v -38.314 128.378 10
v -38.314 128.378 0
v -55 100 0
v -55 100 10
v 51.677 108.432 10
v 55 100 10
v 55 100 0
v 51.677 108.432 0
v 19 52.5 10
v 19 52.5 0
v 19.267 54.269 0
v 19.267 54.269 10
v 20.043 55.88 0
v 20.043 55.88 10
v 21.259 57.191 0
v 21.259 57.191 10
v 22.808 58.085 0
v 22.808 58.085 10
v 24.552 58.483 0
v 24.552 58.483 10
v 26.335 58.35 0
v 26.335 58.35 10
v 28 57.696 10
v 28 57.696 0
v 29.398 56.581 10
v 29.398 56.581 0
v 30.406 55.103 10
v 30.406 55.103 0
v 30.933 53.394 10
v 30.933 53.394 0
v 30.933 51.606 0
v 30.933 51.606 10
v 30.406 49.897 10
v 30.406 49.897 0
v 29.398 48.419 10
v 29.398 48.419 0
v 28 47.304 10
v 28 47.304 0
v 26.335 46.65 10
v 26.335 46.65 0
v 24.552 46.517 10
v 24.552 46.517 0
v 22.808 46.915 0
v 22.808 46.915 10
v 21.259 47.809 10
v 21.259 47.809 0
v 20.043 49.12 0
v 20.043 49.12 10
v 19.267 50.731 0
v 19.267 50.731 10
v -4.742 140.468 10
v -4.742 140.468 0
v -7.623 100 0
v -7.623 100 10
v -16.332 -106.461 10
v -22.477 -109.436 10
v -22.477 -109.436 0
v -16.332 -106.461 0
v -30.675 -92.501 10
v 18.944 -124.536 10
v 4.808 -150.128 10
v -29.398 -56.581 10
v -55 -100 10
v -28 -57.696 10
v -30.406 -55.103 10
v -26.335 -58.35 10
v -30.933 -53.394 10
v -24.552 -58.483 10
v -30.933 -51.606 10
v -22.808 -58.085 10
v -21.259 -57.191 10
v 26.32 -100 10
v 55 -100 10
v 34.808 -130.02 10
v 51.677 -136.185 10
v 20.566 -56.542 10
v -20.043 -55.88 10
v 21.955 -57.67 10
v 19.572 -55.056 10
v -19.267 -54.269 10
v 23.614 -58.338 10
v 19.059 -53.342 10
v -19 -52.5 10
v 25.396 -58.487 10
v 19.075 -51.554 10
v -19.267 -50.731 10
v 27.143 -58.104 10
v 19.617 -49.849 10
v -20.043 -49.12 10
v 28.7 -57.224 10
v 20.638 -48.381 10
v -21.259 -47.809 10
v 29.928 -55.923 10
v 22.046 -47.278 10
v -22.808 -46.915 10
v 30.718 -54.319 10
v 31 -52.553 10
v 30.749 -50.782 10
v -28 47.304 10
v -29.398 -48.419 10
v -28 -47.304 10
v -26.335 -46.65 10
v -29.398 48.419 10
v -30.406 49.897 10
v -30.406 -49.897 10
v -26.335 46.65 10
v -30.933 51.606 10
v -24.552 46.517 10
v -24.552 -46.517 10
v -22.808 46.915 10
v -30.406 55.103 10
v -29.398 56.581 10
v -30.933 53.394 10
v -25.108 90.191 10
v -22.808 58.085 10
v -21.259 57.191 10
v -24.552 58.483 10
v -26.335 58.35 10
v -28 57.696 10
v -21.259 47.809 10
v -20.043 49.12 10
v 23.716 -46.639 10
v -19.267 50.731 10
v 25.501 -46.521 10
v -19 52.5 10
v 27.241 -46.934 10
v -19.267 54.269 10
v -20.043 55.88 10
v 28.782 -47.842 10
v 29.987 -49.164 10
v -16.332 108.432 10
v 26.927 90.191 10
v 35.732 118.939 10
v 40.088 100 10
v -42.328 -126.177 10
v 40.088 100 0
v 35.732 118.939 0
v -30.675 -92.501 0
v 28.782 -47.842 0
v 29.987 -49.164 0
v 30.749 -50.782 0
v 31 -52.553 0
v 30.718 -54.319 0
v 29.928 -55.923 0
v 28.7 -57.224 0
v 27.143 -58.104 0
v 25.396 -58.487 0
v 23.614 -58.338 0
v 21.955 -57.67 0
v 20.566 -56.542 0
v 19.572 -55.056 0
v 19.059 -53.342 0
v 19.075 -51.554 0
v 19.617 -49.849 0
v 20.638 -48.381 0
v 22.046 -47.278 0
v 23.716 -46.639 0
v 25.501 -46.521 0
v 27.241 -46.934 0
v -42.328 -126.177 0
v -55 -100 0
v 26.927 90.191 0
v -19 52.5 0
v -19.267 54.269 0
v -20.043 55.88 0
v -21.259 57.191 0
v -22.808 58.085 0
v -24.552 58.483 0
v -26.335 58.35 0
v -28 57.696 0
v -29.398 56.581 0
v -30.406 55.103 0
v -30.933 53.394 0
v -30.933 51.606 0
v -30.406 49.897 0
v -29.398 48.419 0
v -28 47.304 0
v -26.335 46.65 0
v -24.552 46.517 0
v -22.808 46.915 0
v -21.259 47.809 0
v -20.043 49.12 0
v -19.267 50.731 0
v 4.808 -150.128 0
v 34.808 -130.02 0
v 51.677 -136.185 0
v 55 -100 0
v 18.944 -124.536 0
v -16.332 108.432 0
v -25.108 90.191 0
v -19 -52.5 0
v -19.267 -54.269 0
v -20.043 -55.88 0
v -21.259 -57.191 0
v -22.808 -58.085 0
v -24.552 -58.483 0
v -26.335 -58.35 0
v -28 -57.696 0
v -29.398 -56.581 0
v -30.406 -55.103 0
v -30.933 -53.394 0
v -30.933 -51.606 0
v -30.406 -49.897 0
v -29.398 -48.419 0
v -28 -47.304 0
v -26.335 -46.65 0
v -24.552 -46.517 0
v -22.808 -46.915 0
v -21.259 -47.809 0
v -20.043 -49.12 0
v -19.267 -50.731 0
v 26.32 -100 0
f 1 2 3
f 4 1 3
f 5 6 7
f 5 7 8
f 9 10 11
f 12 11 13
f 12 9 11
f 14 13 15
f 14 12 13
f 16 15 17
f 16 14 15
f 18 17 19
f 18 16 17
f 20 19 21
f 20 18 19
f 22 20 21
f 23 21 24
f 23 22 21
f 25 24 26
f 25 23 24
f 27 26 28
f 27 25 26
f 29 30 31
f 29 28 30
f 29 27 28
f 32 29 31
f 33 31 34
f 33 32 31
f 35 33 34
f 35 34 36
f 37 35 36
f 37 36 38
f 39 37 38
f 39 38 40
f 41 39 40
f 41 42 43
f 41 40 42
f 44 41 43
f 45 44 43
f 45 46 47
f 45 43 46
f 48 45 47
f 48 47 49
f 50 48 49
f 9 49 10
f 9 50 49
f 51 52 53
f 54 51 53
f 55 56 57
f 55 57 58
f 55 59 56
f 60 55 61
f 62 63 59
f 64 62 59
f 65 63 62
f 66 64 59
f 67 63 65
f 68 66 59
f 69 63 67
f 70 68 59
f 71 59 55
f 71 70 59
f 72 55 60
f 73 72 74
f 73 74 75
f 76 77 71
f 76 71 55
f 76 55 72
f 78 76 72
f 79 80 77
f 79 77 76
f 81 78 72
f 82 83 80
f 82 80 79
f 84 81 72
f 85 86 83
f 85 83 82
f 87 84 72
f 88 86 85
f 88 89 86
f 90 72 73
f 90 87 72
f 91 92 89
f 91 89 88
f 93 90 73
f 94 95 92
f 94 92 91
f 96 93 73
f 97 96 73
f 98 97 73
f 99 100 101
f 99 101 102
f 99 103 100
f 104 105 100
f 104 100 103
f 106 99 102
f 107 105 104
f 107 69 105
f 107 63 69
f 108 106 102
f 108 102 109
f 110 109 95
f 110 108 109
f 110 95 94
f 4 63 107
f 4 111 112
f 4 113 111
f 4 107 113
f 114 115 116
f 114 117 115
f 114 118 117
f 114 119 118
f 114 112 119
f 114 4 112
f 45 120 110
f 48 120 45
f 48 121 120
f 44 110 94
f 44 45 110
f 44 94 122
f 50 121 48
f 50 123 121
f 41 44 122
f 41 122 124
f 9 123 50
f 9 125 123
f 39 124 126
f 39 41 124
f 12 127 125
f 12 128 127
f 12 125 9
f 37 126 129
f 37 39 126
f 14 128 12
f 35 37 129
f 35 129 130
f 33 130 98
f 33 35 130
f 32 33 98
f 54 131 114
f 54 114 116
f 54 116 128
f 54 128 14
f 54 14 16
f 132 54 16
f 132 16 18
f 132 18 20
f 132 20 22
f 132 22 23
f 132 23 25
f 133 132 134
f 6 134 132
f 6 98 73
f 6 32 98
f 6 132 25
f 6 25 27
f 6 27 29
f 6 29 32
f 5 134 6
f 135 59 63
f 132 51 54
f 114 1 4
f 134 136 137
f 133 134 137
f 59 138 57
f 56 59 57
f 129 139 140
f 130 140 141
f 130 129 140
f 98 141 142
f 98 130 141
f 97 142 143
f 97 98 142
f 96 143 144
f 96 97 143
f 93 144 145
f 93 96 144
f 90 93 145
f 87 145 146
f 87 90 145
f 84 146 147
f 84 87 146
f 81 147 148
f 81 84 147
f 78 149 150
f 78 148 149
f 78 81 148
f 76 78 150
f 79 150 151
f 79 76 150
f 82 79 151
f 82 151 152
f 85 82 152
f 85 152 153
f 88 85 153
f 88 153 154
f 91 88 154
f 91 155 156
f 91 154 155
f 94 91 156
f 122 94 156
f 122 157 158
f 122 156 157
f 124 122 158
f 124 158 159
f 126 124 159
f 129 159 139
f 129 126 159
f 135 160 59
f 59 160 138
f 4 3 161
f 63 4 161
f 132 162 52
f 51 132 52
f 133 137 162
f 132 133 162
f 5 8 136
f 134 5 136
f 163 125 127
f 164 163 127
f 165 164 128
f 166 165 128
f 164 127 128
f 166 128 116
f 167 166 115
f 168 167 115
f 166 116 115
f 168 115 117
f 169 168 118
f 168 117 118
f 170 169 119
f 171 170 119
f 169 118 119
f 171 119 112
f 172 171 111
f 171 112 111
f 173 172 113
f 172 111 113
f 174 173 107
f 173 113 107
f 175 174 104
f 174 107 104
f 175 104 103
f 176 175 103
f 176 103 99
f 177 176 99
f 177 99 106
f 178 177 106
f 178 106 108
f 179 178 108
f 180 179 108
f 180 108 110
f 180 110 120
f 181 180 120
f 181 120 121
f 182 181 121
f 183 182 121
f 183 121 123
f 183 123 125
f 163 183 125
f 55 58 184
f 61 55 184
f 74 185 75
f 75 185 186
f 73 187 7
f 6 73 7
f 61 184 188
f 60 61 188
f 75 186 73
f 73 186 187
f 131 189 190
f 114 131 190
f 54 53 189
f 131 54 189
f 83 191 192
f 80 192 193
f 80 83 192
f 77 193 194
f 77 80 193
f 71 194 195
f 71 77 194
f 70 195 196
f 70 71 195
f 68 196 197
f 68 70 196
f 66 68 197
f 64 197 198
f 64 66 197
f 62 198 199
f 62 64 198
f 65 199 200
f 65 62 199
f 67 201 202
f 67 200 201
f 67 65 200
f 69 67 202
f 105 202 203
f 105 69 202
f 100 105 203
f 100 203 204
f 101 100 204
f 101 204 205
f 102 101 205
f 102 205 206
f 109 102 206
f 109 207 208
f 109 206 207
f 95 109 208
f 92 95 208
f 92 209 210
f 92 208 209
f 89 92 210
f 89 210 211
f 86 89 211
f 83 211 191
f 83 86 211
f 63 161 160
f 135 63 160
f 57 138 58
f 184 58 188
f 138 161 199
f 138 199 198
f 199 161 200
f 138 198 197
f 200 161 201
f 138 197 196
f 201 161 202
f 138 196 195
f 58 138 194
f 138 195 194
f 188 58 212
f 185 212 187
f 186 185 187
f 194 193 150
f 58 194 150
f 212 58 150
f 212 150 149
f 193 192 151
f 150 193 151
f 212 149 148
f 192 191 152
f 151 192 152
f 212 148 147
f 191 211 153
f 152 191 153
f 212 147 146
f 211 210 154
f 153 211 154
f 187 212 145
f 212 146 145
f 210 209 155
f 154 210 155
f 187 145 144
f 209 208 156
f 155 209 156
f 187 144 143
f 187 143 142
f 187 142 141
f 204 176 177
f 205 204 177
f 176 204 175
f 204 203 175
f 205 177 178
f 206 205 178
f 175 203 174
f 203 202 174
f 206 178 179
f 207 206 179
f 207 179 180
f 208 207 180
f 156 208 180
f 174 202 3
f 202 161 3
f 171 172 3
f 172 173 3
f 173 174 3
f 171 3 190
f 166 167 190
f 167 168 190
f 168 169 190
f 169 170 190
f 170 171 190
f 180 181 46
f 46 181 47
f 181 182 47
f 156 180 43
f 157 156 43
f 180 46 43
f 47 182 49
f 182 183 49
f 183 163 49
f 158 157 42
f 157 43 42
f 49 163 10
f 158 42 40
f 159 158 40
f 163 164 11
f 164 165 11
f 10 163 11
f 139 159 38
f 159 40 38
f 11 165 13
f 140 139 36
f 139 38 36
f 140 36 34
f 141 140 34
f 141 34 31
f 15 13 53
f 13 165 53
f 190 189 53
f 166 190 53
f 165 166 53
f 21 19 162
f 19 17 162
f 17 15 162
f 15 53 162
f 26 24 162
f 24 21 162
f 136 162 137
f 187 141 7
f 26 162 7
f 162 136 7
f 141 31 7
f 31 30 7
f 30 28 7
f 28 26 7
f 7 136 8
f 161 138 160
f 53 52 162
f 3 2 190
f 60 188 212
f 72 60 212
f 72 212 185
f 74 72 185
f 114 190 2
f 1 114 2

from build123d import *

# Parameters (mm, degrees)
F1_DEPTH = 10
F2_R     = 6
F3_DEPTH = 10.001


# Not quite as in the source:
# - a pattern or mirror of a feature is missing from the dataset's text; its kind, count and spacing are read off the source's solid


with BuildPart() as f1:
    # F0 (on Top) → F1 (new body)
    with BuildSketch(Plane.XY):
        Polygon((-55, 100), (-55, -100), (-42.3276498914, -126.1771321297), (-30.6749343872, -92.5011336803), (-22.4767297883, -109.4360733855), (-16.331512481, -106.4611735826), (4.8077032396, -150.1282154724), (18.9439784735, -124.5355084538), (26.3201091439, -100), (34.8079055548, -130.0195604563), (51.677390933, -136.1848264933), (55, -100), (55, 100), (51.677390933, 108.4323301911), (40.0880090892, 100), (35.7317700982, 118.9388260245), (26.9271209836, 90.1910439134), (-4.7420188785, 140.4679864645), (-7.6231127605, 100), (-16.331512481, 108.4323301911), (-25.1079257578, 90.1910439134), (-38.313575089, 128.3779740334), align=None)
    extrude(amount=F1_DEPTH)

    # F2 (on face) → F3 (cut, through all)
    with BuildSketch(Plane.XY.offset(10)):
        with Locations((-25, 52.5)):
            Circle(F2_R)
    f3 = extrude(amount=-F3_DEPTH, mode=Mode.SUBTRACT)

    # F3_copies: F3 across plane
    add(f3.mirror(Plane(origin=(0, 0, 0), x_dir=(0, 0, -1), z_dir=(0, -1, 0))), mode=Mode.SUBTRACT)

    # F3_copies1: F3 across plane
    add(f3.mirror(Plane(origin=(0, 0, 0), x_dir=(0, 0, 1), z_dir=(1, 0, 0))), mode=Mode.SUBTRACT)

    # F3_copies2: F3 across plane
    add(f3.mirror(Plane(origin=(0, 0, 0), x_dir=(-0.9028605188, -0.4299335804, 0), z_dir=(0.4299335804, -0.9028605188, 0))), mode=Mode.SUBTRACT)


solid = f1.part
